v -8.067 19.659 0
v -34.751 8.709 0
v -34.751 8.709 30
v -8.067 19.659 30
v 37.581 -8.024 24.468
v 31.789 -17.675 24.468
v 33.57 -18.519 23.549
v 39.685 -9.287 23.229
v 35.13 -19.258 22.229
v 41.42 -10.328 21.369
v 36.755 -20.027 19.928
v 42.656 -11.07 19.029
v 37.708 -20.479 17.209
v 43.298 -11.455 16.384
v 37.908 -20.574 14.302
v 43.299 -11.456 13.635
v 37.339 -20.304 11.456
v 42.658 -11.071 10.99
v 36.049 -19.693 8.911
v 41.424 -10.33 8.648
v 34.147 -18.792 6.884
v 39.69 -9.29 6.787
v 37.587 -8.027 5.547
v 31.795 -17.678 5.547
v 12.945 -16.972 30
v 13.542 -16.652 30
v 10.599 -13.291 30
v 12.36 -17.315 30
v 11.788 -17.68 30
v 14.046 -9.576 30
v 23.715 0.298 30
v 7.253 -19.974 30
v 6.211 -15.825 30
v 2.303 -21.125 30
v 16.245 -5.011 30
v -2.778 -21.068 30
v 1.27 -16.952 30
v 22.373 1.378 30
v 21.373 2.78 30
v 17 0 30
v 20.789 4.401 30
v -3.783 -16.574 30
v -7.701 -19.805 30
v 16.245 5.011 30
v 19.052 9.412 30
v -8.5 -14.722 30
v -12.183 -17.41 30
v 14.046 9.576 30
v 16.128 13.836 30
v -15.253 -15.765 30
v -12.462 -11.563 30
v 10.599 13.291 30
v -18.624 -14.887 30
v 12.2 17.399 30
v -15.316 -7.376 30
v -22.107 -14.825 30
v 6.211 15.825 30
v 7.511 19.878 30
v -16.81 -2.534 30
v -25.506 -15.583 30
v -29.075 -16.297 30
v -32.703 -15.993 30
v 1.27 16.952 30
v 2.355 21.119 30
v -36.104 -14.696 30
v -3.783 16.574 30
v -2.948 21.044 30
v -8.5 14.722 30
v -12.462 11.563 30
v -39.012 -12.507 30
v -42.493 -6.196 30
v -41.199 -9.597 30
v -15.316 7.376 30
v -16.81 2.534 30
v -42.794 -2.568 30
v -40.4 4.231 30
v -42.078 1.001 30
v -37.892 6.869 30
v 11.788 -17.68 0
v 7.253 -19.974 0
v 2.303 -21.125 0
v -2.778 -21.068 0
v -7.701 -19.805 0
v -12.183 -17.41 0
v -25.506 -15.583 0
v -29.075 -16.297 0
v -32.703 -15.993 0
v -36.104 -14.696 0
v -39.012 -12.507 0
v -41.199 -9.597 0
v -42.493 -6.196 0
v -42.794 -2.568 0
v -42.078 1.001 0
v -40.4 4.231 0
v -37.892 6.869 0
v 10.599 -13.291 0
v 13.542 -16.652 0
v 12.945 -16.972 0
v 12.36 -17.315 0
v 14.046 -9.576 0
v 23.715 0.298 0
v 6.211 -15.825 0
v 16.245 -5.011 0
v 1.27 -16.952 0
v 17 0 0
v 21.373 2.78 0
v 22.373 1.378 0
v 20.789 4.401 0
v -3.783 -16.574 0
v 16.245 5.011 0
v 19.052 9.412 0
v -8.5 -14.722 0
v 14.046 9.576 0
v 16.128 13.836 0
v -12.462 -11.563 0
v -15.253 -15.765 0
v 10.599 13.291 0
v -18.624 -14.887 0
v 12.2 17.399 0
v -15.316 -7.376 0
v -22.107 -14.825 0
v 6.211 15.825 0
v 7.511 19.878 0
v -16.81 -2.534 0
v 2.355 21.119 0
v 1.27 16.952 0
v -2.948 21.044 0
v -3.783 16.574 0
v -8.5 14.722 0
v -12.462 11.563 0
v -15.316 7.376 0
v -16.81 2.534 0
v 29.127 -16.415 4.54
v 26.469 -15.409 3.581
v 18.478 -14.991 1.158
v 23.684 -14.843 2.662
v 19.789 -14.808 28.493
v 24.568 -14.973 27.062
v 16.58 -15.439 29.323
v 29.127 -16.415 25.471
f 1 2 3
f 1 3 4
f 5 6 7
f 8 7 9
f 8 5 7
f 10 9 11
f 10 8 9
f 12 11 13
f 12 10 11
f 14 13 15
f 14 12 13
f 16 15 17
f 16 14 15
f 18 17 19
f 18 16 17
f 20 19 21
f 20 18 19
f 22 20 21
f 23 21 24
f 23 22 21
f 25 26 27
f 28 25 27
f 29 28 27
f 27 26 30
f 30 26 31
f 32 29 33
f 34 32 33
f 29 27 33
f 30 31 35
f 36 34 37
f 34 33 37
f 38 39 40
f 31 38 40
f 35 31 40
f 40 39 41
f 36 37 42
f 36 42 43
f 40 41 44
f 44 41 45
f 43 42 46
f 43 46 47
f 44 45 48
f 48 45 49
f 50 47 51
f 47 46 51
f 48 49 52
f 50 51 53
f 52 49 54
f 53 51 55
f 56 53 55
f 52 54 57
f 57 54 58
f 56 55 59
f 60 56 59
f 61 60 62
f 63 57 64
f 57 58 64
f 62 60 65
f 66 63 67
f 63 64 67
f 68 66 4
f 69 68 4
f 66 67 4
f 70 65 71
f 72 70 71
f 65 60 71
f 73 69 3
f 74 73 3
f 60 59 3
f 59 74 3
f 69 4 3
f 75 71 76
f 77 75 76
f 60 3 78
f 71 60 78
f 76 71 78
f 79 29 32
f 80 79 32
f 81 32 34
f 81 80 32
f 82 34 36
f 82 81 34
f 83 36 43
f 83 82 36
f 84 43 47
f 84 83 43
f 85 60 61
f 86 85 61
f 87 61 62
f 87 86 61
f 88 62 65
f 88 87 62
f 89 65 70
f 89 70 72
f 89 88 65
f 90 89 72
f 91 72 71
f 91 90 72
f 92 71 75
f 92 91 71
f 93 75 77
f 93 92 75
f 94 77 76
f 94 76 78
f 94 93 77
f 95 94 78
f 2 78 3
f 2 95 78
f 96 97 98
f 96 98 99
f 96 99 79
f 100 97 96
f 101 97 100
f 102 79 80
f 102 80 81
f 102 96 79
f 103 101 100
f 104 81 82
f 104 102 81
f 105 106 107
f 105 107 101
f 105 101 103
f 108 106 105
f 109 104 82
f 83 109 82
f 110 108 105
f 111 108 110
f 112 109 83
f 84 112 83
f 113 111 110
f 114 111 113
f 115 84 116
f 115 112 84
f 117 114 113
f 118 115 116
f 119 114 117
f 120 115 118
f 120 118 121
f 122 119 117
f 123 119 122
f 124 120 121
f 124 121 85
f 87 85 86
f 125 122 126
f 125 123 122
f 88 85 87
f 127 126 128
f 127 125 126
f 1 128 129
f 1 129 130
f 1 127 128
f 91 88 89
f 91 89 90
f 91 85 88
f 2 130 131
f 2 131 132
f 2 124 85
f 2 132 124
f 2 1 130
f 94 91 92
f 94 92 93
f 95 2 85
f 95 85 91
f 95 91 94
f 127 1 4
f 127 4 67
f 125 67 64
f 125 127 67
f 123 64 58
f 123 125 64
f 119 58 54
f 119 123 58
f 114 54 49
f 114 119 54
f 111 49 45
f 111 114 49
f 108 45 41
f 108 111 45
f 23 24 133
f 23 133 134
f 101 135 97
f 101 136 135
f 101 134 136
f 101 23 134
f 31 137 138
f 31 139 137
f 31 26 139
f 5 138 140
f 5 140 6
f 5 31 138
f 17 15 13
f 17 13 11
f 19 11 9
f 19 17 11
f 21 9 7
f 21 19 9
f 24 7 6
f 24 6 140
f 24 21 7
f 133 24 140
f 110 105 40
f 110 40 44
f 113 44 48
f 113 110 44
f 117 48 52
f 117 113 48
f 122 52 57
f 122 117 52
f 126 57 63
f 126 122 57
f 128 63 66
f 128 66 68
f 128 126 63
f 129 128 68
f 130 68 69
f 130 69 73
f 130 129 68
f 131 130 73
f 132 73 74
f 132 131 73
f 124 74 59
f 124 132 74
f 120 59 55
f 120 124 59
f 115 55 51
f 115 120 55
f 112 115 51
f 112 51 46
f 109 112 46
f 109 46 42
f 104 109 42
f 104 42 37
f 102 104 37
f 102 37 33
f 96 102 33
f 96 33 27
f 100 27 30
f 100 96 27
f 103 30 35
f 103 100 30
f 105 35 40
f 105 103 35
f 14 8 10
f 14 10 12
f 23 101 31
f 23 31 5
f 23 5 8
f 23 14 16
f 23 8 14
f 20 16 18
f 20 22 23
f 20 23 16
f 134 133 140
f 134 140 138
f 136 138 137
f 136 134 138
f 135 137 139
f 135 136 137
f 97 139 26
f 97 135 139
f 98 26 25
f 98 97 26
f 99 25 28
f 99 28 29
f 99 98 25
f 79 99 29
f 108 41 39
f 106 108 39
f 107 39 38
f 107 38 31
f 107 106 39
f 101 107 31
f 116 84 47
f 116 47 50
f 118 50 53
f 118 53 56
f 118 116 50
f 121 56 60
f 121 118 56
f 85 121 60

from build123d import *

# Parameters (mm, degrees)
CROQUIS1_R              = 17
SALIENTE_EXTRUIR1_DEPTH = 30
CORTAR_EXTRUIR5_DEPTH   = 66.901748436


with BuildPart() as part:
    # Croquis1 → Saliente-Extruir1 (new body)
    with BuildSketch(Plane.XY):
        with BuildLine():
            Line((-34.751366554, 8.708761257), (-8.067498219, 19.65904302))
            ThreePointArc((-8.067498219, 19.65904302), (9.932956283, 18.785602984), (20.78928746, 4.400912053))
            ThreePointArc((20.78928746, 4.400912053), (21.824692428, 2.04462752), (23.714959375, 0.297907417))
            Line((23.714959375, 0.297907417), (43.380202362, -11.504419481))
            Line((43.380202362, -11.504419481), (37.980772654, -20.60816348))
            Line((37.980772654, -20.60816348), (29.126956343, -16.414809963))
            ThreePointArc((29.126956343, -16.414809963), (20.290915471, -14.763720087), (11.788304563, -17.680451791))
            ThreePointArc((11.788304563, -17.680451791), (-0.239292664, -21.24865264), (-12.18348282, -17.410492422))
            ThreePointArc((-12.18348282, -17.410492422), (-18.624029112, -14.886802036), (-25.506269787, -15.582799871))
            ThreePointArc((-25.506269787, -15.582799871), (-41.965765273, -7.942029126), (-34.751366554, 8.708761257))
        make_face()
        Circle(CROQUIS1_R, mode=Mode.SUBTRACT)
    extrude(amount=SALIENTE_EXTRUIR1_DEPTH)

    # Croquis7 → Cortar-Extruir5 (cut, through all)
    with BuildSketch(Plane(origin=(6.411424524, 10.682827398, 0), x_dir=(0.857431728196329, -0.5145977375409424, 0), z_dir=(0.5145977375409424, 0.857431728196329, 0))):
        with BuildLine():
            Line((20.180656118, 0), (20.180656118, 9.238458875))
            Line((20.180656118, 9.238458875), (56.582580984, 4.619229438))
            Line((56.582580984, 4.619229438), (52.496685568, -37.874416839))
            Line((52.496685568, -37.874416839), (21.89416276, -35.456233837))
            Line((21.89416276, -35.456233837), (20.180656118, -30))
            Line((20.180656118, -30), (36.352428356, -24.467854313))
            ThreePointArc((36.352428356, -24.467854313), (43.115709537, -15.009568923), (36.358878018, -5.546674933))
            Line((36.358878018, -5.546674933), (20.180656118, 0))
        make_face()
    extrude(amount=-CORTAR_EXTRUIR5_DEPTH, mode=Mode.SUBTRACT)


solid = part.part
